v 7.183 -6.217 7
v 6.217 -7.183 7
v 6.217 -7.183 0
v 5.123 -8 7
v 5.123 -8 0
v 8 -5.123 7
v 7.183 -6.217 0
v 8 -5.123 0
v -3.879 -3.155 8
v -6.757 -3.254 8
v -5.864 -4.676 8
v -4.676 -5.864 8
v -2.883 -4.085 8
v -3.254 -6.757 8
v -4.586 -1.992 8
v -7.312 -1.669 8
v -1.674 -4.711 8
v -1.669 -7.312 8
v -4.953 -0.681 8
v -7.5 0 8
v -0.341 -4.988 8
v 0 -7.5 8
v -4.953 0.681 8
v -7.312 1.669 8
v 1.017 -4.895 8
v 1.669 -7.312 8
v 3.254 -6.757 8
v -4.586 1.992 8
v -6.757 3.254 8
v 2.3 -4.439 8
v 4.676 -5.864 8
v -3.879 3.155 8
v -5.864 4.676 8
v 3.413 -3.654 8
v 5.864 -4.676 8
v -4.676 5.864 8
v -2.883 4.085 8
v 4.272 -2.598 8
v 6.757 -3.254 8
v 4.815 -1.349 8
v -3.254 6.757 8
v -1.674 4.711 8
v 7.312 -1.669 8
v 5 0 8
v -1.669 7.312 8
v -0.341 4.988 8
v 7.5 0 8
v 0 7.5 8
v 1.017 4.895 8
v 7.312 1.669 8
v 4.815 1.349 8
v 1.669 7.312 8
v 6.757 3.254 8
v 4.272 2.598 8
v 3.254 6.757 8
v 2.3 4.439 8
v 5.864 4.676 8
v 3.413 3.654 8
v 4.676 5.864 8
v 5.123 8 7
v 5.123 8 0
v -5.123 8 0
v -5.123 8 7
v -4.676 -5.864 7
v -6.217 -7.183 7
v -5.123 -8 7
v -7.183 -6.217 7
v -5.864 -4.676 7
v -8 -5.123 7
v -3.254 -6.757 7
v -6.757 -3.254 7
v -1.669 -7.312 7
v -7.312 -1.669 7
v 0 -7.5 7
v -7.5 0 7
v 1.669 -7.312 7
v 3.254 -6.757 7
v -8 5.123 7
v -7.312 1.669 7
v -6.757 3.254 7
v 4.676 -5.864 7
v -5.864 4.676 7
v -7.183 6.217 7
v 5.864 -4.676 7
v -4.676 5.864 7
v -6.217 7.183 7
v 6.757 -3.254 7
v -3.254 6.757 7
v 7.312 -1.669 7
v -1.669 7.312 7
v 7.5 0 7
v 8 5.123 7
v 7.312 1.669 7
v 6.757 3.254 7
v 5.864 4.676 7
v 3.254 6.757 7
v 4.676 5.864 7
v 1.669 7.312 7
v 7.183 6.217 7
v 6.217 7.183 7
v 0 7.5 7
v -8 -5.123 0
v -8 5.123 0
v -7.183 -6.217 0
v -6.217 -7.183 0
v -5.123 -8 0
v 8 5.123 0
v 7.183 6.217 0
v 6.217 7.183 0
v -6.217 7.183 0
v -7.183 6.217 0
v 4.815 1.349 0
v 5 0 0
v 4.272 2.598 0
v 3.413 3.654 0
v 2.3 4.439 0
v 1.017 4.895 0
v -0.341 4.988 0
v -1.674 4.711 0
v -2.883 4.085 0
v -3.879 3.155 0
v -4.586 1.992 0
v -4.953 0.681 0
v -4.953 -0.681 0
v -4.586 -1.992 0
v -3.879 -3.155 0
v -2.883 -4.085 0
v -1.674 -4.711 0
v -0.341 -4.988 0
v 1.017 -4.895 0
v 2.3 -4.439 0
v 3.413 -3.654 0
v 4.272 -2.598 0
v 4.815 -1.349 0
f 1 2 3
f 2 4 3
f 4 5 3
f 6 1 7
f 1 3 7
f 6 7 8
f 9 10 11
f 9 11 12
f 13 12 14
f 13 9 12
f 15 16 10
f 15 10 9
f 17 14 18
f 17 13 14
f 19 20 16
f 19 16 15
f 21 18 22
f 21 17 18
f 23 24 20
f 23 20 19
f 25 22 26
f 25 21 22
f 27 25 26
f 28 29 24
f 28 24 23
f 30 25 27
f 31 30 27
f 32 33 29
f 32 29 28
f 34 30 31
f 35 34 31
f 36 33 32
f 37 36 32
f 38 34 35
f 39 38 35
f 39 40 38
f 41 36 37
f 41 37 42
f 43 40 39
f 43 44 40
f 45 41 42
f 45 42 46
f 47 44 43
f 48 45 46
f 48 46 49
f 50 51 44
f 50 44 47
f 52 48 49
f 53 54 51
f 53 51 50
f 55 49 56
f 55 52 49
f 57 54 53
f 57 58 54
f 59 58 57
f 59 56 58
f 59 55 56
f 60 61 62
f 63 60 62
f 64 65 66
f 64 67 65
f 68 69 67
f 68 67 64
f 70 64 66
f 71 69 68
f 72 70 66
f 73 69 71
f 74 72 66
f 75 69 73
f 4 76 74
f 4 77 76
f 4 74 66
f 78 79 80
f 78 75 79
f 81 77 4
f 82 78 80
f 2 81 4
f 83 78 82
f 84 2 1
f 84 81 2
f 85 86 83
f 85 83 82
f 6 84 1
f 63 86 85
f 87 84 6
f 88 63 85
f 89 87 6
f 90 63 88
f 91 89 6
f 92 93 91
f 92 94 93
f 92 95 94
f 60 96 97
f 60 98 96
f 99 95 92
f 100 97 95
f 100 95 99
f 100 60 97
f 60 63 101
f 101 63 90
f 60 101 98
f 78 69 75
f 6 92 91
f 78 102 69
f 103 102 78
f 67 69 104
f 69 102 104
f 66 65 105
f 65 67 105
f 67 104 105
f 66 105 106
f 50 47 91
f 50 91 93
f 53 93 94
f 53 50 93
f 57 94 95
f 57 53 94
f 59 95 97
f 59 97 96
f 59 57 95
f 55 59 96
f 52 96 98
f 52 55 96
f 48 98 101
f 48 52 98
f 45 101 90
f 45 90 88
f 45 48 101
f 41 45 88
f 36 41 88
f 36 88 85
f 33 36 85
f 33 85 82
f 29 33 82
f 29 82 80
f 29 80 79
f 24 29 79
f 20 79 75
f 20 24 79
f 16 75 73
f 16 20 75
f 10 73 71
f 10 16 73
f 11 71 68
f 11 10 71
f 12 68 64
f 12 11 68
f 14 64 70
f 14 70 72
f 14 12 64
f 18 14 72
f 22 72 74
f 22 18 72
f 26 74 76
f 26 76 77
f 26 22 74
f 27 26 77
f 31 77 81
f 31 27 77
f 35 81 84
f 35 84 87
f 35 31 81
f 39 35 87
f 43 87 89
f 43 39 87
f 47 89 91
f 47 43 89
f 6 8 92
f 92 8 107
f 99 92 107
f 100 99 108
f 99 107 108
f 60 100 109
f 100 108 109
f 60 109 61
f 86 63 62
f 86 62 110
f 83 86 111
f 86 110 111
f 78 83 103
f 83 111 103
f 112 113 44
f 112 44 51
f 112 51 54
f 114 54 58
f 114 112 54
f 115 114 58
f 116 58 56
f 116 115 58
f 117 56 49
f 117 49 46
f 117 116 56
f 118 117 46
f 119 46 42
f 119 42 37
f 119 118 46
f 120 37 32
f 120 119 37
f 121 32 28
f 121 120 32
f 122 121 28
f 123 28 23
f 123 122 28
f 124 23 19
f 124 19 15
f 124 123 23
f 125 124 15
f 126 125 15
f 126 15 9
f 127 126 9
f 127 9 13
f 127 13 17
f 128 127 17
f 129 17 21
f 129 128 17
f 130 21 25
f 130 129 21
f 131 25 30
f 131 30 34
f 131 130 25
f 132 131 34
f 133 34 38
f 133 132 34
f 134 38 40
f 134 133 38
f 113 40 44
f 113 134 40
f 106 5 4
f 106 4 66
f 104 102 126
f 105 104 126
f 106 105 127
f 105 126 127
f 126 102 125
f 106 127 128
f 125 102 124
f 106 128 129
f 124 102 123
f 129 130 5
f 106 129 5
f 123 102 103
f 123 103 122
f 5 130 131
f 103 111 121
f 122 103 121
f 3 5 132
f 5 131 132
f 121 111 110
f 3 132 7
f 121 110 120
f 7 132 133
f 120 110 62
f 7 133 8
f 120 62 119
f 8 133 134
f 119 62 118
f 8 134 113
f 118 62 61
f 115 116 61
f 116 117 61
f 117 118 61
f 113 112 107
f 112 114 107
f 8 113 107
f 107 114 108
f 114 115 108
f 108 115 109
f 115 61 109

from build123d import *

# Parameters (mm, degrees)
SKIZZE1_R                       = 9.5
SKIZZE1_R_2                     = 5
AUFSATZ_LINEAR_AUSTRAGEN1_DEPTH = 8
SKIZZE2_OUTSIDE_W               = 26.608
SKIZZE2_OUTSIDE_H               = 26.608
SKIZZE2_OUTSIDE_W_2             = 16
SKIZZE2_OUTSIDE_H_2             = 16
SCHNITT_LINEAR_AUSTRAGEN1_DEPTH = 28
SKIZZE3_OUTSIDE_W               = 22.8
SKIZZE3_OUTSIDE_H               = 22.8
SKIZZE3_OUTSIDE_R               = 7.5
SCHNITT_LINEAR_AUSTRAGEN2_DEPTH = 1


with BuildPart() as part:
    # Skizze1 → Aufsatz-Linear austragen1 (new body)
    with BuildSketch(Plane.XY):
        Circle(SKIZZE1_R)
        Circle(SKIZZE1_R_2, mode=Mode.SUBTRACT)
    extrude(amount=AUFSATZ_LINEAR_AUSTRAGEN1_DEPTH)

    # Skizze2 outside → Schnitt-Linear austragen1 (cut)
    with BuildSketch(Plane(origin=(0, 0, 0), x_dir=(-1, 0, 0), z_dir=(0, 0, -1))):
        Rectangle(SKIZZE2_OUTSIDE_W, SKIZZE2_OUTSIDE_H)
        Rectangle(SKIZZE2_OUTSIDE_W_2, SKIZZE2_OUTSIDE_H_2, mode=Mode.SUBTRACT)
    extrude(amount=-SCHNITT_LINEAR_AUSTRAGEN1_DEPTH, mode=Mode.SUBTRACT)

    # Skizze3 outside → Schnitt-Linear austragen2 (cut)
    with BuildSketch(Plane.XY.offset(8)):
        Rectangle(SKIZZE3_OUTSIDE_W, SKIZZE3_OUTSIDE_H)
        Circle(SKIZZE3_OUTSIDE_R, mode=Mode.SUBTRACT)
    extrude(amount=-SCHNITT_LINEAR_AUSTRAGEN2_DEPTH, mode=Mode.SUBTRACT)


solid = part.part
